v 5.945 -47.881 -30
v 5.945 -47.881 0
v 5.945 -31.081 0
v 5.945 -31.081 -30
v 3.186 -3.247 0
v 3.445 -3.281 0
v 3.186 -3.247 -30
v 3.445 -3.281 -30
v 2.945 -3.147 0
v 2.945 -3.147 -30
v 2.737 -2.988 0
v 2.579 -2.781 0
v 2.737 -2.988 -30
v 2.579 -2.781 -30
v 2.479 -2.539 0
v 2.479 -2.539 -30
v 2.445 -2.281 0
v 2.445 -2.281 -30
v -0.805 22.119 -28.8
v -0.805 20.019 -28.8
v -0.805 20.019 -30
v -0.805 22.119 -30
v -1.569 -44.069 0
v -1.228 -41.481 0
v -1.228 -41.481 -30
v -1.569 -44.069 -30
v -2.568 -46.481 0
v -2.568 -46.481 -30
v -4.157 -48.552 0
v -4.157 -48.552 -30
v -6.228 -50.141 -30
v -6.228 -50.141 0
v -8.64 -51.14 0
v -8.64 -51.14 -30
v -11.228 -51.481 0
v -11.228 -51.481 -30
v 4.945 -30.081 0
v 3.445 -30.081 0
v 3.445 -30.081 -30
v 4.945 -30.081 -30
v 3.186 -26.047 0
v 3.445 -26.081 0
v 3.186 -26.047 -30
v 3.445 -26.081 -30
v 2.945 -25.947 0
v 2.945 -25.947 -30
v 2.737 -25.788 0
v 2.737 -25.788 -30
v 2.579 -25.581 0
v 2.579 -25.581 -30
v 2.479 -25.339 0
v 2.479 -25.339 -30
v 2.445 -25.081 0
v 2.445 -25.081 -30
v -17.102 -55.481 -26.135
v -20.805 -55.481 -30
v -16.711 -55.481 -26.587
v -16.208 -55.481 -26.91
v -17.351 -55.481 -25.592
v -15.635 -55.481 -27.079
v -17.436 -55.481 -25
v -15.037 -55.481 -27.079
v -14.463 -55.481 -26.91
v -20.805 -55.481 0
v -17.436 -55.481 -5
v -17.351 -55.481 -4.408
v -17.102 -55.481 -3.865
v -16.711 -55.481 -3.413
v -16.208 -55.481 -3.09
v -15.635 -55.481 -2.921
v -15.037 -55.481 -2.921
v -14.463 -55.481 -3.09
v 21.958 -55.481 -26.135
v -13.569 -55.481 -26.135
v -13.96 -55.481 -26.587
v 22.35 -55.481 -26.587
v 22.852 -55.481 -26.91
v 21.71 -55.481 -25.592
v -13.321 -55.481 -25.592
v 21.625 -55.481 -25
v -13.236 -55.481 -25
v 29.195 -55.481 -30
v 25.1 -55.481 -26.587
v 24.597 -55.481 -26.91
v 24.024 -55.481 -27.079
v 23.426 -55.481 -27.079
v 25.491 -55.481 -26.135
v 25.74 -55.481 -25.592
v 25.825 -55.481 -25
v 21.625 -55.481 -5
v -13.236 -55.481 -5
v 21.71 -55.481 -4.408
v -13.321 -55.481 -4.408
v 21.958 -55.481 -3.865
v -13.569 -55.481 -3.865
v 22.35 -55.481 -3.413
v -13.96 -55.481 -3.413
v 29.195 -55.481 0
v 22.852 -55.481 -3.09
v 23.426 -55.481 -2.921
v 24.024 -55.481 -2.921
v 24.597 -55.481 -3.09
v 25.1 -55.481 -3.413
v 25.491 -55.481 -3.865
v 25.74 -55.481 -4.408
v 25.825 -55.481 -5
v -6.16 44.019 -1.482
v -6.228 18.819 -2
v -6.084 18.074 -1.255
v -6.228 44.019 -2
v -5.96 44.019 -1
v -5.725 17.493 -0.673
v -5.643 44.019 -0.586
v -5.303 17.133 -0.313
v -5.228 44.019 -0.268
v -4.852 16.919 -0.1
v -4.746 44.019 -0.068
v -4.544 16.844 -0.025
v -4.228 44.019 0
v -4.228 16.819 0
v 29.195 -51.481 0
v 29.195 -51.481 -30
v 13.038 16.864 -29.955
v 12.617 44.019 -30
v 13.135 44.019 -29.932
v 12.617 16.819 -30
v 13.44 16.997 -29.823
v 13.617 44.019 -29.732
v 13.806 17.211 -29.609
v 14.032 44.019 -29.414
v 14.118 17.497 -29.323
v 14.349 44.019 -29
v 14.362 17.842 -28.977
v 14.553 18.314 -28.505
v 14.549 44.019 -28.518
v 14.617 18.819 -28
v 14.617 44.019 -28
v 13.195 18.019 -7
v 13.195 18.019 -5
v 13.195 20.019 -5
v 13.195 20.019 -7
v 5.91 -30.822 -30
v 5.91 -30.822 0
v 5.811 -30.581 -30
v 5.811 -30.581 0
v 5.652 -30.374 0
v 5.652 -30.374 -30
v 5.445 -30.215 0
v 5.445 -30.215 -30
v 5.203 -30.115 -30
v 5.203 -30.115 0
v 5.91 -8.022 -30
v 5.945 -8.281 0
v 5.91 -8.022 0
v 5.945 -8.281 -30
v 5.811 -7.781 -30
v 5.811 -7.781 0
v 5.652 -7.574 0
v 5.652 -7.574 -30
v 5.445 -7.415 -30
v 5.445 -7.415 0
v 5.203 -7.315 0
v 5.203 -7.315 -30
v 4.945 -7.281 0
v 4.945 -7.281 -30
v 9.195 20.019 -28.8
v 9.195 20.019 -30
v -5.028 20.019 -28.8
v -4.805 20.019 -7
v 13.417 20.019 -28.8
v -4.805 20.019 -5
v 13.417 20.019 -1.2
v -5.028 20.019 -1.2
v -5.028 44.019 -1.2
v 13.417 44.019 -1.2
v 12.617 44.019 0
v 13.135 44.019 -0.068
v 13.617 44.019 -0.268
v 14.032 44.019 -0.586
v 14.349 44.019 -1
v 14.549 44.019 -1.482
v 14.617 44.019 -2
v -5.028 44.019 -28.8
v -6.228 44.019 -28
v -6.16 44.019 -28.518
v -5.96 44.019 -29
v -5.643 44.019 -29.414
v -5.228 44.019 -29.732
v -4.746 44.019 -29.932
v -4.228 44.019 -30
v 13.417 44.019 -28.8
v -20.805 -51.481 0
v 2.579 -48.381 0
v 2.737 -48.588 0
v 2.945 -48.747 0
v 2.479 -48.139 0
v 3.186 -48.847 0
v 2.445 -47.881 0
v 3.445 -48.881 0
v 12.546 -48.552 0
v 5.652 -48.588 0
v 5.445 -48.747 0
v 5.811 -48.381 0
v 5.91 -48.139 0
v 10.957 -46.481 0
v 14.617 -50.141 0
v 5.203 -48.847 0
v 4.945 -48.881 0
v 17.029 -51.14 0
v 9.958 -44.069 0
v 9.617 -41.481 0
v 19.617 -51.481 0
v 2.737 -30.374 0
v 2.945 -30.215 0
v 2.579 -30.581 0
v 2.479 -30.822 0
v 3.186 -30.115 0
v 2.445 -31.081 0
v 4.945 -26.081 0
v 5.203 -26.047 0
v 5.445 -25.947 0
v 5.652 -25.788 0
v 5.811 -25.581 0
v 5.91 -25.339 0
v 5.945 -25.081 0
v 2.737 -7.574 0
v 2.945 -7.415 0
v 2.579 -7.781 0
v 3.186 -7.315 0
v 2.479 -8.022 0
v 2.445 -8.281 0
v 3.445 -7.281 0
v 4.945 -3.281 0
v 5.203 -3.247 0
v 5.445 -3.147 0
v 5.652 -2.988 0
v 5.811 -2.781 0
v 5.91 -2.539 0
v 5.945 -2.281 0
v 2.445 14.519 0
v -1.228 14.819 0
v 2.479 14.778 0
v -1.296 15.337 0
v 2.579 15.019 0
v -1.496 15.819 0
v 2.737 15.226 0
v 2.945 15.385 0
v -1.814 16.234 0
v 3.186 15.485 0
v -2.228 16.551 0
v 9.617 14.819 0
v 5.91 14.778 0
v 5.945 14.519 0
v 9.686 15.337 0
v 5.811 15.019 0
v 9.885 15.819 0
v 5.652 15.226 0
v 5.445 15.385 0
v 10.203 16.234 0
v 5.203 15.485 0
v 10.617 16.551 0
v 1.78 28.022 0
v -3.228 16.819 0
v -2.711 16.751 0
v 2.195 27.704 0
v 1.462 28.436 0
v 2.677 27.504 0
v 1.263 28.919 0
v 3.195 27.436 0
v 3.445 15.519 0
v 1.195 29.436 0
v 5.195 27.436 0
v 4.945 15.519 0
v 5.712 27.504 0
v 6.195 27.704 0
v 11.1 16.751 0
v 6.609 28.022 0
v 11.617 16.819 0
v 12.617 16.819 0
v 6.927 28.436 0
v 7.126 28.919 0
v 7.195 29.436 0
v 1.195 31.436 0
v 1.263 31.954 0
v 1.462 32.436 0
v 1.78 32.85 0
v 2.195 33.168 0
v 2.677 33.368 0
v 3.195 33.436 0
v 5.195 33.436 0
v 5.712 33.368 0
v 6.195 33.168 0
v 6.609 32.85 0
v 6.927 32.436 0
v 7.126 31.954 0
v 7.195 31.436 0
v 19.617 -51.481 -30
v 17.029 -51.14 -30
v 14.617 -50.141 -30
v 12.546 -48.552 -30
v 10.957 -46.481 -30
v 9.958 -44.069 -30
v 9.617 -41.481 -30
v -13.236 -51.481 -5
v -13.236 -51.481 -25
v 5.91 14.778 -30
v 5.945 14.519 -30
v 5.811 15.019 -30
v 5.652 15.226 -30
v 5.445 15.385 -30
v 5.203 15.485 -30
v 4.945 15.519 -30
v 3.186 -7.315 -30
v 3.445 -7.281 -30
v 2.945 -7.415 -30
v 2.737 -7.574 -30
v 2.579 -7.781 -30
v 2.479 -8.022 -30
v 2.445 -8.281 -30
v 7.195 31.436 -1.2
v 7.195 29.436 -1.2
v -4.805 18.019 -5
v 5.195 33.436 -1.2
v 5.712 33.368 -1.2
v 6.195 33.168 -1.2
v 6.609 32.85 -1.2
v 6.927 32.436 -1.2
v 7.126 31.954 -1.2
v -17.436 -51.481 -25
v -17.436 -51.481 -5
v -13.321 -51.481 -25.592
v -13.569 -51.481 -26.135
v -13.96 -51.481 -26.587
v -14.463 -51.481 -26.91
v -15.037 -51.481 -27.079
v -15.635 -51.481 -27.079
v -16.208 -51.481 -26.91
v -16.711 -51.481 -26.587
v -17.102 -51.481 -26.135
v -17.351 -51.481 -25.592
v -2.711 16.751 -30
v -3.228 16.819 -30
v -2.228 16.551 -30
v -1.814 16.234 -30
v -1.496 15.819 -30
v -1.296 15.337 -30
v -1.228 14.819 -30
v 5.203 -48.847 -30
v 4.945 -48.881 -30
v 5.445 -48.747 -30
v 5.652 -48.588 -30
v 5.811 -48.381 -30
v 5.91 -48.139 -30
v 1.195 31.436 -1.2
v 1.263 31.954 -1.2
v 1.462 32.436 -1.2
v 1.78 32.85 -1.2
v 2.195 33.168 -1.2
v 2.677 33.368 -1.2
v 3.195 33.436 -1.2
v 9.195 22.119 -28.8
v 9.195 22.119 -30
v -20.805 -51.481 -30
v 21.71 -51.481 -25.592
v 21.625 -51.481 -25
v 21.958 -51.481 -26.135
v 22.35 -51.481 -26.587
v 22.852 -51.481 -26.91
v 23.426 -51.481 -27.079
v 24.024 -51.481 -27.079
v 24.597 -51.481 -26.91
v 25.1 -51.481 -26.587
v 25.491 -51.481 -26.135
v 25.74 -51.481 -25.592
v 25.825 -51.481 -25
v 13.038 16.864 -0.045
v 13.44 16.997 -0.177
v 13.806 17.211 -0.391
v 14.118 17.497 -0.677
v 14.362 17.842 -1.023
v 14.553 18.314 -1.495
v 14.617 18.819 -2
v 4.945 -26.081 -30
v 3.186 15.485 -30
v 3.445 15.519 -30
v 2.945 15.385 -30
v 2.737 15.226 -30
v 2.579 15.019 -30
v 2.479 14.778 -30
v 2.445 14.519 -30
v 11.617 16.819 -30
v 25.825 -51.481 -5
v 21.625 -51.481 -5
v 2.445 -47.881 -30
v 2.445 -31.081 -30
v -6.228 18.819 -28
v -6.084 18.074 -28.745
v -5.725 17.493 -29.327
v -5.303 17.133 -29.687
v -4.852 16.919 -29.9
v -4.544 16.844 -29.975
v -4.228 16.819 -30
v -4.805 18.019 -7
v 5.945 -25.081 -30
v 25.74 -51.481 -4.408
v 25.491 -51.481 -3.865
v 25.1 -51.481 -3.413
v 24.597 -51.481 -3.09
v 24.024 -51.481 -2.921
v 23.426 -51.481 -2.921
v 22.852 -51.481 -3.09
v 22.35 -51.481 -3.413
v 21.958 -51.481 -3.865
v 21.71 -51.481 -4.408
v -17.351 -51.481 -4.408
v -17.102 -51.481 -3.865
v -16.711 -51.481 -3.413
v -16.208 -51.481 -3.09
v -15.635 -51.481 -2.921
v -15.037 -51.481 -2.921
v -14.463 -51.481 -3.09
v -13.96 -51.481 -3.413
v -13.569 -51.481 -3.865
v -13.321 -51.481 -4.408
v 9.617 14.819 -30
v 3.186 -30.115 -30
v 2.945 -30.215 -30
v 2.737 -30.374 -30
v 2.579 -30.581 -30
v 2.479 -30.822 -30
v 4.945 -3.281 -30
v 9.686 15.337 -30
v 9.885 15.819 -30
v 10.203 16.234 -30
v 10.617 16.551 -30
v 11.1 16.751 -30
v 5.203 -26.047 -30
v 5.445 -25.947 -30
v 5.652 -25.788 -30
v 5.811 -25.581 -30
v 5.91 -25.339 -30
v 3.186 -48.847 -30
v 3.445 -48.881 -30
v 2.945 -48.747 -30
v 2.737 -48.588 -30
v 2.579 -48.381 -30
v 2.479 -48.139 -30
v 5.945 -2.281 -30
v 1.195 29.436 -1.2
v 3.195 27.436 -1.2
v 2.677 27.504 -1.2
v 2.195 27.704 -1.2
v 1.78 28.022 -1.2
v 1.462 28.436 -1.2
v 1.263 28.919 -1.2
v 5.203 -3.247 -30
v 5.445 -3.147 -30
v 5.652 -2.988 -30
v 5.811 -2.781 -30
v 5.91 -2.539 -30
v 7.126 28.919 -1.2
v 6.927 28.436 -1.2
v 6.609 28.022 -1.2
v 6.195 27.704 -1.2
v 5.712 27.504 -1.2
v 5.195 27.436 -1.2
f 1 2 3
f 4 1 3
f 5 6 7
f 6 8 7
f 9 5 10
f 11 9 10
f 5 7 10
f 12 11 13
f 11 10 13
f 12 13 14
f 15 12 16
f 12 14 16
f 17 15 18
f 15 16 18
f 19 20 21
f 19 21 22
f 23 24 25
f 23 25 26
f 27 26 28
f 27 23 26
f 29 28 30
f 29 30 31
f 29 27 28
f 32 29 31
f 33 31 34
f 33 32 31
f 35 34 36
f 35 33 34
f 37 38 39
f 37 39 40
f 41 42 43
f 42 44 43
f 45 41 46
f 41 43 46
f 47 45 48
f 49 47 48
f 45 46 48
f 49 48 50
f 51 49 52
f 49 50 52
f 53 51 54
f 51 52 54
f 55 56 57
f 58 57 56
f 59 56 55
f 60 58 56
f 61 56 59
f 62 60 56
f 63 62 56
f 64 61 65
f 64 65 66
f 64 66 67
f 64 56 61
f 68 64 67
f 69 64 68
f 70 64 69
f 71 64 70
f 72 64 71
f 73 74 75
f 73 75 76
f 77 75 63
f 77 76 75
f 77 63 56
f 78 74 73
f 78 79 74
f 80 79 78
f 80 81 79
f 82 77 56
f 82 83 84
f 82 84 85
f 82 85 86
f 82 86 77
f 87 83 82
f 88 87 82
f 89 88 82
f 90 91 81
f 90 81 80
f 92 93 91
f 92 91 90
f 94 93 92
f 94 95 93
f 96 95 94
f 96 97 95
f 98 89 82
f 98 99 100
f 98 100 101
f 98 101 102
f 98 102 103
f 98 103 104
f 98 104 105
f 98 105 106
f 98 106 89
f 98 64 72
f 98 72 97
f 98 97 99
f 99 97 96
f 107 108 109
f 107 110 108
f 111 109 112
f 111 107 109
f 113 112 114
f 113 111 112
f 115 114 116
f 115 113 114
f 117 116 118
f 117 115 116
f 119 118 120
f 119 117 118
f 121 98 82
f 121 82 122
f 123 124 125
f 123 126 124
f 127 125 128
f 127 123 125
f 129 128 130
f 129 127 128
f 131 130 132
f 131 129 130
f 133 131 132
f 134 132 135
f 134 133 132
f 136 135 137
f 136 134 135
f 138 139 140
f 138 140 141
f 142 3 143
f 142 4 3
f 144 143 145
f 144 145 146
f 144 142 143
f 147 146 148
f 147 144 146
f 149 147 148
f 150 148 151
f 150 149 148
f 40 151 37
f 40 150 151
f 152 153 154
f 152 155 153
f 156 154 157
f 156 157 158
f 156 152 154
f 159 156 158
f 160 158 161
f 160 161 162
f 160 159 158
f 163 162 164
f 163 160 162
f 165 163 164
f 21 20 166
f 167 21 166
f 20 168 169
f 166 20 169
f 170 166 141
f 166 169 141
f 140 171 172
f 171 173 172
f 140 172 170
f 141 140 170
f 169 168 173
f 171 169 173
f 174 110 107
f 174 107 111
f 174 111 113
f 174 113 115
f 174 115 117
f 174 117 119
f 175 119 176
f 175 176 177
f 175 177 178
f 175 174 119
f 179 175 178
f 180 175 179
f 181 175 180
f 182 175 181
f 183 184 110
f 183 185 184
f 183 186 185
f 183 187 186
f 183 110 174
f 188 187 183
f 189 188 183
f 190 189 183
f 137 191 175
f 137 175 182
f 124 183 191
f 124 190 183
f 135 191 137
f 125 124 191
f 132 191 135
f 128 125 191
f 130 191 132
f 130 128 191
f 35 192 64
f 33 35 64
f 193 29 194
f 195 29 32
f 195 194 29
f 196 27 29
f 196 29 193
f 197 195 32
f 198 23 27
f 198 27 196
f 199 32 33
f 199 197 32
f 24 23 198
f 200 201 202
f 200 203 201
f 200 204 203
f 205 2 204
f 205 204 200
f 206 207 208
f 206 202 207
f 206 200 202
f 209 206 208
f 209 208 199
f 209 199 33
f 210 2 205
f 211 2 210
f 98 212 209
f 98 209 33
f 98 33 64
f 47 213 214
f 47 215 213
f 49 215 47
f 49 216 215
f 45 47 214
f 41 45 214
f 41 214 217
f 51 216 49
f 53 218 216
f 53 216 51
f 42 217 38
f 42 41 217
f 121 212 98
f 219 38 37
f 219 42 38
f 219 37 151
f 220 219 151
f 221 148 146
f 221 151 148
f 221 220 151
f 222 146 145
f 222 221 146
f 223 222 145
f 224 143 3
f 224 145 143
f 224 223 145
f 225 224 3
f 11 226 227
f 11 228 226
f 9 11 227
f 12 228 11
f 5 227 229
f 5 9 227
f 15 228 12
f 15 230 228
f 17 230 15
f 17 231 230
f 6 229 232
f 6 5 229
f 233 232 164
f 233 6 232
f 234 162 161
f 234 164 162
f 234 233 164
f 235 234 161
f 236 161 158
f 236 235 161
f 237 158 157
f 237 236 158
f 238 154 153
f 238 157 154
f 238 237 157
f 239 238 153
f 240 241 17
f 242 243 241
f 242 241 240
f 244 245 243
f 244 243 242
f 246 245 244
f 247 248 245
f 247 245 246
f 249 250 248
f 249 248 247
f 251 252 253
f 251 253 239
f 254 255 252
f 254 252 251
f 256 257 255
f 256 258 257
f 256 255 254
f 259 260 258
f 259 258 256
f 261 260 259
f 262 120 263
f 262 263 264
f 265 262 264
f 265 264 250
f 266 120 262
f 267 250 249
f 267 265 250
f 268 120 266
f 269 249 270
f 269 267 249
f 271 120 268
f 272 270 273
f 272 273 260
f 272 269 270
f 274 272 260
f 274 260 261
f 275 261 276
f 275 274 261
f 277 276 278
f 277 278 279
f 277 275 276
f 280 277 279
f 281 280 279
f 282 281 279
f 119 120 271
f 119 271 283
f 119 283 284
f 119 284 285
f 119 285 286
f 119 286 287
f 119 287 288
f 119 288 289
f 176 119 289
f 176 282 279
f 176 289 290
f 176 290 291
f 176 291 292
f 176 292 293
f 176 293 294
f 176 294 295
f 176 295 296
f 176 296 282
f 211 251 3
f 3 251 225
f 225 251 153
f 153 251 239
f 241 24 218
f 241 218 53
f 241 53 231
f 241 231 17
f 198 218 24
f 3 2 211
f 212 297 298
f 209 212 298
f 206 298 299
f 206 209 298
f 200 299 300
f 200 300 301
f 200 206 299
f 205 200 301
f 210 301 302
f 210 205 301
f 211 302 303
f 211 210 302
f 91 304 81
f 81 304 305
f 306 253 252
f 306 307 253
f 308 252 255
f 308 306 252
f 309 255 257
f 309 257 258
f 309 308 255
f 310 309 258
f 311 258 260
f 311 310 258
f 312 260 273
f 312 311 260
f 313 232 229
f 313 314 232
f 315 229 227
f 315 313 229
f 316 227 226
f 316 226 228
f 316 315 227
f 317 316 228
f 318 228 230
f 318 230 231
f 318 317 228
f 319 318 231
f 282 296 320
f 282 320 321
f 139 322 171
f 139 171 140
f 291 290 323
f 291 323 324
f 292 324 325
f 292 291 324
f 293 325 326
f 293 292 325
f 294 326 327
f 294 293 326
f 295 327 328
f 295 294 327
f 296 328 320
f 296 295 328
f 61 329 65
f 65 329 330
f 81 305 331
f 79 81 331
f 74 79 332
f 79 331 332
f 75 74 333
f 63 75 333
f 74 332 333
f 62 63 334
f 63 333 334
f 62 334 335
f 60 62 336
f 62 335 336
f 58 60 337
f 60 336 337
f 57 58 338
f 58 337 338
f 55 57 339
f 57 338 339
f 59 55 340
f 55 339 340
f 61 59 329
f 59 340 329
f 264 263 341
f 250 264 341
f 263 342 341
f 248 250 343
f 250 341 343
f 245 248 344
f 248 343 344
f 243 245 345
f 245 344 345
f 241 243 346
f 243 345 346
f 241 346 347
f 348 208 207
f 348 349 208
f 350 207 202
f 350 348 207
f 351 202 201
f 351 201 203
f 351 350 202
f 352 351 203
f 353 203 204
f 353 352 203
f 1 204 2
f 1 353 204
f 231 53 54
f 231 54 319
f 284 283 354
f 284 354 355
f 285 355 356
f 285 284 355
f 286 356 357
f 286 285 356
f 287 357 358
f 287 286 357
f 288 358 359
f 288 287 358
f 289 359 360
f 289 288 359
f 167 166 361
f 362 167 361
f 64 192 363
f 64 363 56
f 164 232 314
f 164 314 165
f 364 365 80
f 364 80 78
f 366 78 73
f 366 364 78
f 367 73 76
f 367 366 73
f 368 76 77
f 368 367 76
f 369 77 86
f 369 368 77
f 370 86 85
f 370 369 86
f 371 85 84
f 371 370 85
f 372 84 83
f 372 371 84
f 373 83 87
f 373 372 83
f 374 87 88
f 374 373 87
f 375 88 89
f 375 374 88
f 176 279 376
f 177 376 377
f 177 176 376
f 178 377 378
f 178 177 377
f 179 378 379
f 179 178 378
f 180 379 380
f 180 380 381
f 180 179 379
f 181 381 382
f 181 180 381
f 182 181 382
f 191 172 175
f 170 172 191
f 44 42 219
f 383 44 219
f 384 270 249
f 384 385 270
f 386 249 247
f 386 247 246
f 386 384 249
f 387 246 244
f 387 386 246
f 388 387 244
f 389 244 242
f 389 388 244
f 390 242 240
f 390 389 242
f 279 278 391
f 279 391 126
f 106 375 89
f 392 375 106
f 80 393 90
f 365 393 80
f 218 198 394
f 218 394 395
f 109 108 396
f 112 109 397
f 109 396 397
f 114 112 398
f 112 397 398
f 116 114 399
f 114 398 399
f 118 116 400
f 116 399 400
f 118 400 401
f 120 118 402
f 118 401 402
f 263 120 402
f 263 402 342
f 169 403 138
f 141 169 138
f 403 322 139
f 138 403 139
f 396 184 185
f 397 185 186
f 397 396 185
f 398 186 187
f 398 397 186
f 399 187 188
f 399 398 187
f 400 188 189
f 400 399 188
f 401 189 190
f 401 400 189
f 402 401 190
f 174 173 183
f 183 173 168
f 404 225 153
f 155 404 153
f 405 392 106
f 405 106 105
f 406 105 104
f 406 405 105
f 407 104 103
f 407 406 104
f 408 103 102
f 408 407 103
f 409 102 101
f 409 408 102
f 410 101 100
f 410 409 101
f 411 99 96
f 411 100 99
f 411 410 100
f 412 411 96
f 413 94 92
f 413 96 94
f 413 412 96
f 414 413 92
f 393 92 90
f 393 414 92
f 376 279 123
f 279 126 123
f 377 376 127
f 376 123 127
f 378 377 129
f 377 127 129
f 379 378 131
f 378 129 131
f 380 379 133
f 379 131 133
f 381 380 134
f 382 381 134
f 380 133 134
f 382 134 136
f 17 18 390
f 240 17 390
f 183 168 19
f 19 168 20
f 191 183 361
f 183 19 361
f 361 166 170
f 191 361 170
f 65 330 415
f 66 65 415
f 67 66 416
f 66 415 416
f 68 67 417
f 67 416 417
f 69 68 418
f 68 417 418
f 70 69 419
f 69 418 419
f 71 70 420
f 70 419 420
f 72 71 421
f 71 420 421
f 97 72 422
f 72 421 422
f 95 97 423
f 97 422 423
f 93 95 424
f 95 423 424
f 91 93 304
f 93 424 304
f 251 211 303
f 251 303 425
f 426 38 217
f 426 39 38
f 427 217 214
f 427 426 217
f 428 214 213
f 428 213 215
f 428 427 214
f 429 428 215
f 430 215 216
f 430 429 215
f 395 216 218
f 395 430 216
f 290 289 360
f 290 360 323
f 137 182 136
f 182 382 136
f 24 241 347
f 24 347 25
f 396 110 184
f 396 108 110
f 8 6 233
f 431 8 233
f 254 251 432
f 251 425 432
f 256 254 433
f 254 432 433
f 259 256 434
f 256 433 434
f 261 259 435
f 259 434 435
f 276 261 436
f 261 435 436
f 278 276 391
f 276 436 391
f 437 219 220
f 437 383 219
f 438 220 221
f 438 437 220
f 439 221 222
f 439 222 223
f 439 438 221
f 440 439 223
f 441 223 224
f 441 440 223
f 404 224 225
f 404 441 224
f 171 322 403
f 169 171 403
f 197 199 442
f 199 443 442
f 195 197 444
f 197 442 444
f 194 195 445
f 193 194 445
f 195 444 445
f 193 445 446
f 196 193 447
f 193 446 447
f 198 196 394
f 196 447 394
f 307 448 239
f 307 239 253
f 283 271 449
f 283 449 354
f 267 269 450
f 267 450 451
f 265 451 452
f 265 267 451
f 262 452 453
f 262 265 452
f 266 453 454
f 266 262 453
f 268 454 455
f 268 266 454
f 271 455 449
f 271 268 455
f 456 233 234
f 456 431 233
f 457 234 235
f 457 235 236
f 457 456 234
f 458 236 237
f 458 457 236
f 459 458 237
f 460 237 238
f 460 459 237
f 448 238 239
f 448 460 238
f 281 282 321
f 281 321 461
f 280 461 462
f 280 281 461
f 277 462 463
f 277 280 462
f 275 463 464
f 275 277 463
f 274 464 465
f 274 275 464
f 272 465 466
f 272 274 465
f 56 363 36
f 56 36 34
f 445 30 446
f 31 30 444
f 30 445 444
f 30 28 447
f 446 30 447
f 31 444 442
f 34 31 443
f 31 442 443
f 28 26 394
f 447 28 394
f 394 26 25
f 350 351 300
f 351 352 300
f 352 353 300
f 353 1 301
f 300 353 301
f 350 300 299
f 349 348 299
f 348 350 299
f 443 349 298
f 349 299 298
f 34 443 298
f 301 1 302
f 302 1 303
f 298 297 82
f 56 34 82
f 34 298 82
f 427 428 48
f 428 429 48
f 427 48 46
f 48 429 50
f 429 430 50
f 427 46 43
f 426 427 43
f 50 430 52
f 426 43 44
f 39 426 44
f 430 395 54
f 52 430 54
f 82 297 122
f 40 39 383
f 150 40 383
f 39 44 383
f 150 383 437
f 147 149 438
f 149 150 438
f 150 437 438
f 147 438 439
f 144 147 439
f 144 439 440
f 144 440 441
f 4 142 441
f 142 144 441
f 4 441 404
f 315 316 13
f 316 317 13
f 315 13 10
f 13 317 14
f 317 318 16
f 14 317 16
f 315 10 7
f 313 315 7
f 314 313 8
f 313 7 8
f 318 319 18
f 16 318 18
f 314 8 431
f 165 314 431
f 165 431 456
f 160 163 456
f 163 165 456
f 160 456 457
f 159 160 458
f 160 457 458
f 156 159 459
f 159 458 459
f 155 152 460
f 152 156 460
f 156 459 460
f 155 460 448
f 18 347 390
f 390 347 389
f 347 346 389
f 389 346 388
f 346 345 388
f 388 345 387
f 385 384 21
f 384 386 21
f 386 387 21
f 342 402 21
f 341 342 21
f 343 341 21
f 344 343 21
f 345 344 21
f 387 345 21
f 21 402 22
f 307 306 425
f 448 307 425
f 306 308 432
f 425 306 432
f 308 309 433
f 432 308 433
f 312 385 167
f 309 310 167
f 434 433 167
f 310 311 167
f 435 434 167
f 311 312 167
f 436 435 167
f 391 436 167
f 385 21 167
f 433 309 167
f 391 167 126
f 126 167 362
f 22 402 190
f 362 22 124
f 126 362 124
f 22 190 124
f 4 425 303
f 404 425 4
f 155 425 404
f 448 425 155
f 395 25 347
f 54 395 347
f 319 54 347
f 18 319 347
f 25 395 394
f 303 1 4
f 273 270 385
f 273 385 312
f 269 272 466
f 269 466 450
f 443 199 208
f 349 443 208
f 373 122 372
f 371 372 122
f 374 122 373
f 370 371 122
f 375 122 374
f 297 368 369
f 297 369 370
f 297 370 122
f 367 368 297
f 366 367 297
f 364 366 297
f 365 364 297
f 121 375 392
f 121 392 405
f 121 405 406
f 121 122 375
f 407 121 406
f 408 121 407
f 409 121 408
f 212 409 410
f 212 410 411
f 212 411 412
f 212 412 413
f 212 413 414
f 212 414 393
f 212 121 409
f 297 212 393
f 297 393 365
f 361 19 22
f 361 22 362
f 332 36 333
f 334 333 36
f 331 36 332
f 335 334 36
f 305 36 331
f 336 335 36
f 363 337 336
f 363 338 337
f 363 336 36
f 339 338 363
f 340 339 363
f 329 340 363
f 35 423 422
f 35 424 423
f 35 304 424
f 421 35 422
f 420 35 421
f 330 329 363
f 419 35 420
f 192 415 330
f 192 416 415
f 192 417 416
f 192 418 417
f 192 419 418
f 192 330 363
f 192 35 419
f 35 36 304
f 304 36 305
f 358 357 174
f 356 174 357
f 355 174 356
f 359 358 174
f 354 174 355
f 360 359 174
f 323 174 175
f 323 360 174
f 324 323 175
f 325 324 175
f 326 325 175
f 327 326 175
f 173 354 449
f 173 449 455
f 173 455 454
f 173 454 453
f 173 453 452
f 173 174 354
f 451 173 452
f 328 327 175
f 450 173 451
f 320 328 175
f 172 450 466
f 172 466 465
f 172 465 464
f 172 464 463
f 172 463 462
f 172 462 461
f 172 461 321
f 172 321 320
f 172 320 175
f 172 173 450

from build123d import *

# Parameters (mm, degrees)
CROQUIS1_W              = 20.84578855
CROQUIS1_H              = 73.5
SALIENTE_EXTRUIR1_DEPTH = 30
CROQUIS2_W              = 20.84578855
CROQUIS2_H              = 30
CROQUIS2_W_2            = 18
CROQUIS2_H_2            = 2
SALIENTE_EXTRUIR2_DEPTH = 2
CROQUIS3_W              = 20.84578855
CROQUIS3_H              = 30
CROQUIS3_W_2            = 18.44578855
CROQUIS3_H_2            = 27.6
SALIENTE_EXTRUIR3_DEPTH = 24
CORTAR_EXTRUIR1_DEPTH   = 12
CROQUIS6_W              = 10
CROQUIS6_H              = 2.1
CORTAR_EXTRUIR2_DEPTH   = 12
CROQUIS7_W              = 5
CROQUIS7_H              = 72.3
CORTAR_EXTRUIR3_DEPTH   = 81
REDONDEO1_R             = 2
SALIENTE_EXTRUIR4_DEPTH = 30
CORTAR_EXTRUIR4_DEPTH   = 30
CROQUIS11_W             = 3.5
CROQUIS11_H             = 18.8
CORTAR_EXTRUIR5_DEPTH   = 30
REDONDEO2_R             = 1


with BuildPart() as part:
    # Croquis1 → Saliente-Extruir1 (new body)
    with BuildSketch(Plane.XY):
        with Locations((4.194544399, -18.730645161)):
            Rectangle(CROQUIS1_W, CROQUIS1_H)
    extrude(amount=-SALIENTE_EXTRUIR1_DEPTH)

    # Croquis2 → Saliente-Extruir2 (add)
    with BuildSketch(Plane(origin=(0, 18.019354839, 0), x_dir=(1, 0, 0), z_dir=(0, 1, 0))):
        with Locations((4.194544399, 15)):
            Rectangle(CROQUIS2_W, CROQUIS2_H)
        with Locations((4.194544399, 6)):
            Rectangle(CROQUIS2_W_2, CROQUIS2_H_2, mode=Mode.SUBTRACT)
    extrude(amount=SALIENTE_EXTRUIR2_DEPTH)

    # Croquis3 → Saliente-Extruir3 (add)
    with BuildSketch(Plane(origin=(0, 20.019354839, 0), x_dir=(1, 0, 0), z_dir=(0, 1, 0))):
        with Locations((4.194544399, 15)):
            Rectangle(CROQUIS3_W, CROQUIS3_H)
        with Locations((4.194544399, 15)):
            Rectangle(CROQUIS3_W_2, CROQUIS3_H_2, mode=Mode.SUBTRACT)
    extrude(amount=SALIENTE_EXTRUIR3_DEPTH)

    # Croquis4 → Cortar-Extruir1 (cut)
    with BuildSketch(Plane.XY):
        with BuildLine():
            Line((3.194544399, 33.436155454), (5.194544399, 33.436155454))
            ThreePointArc((5.194544399, 33.436155454), (6.608757961, 32.850369016), (7.194544399, 31.436155454))
            Line((7.194544399, 31.436155454), (7.194544399, 29.436155454))
            ThreePointArc((7.194544399, 29.436155454), (6.608757961, 28.021941892), (5.194544399, 27.436155454))
            Line((5.194544399, 27.436155454), (3.194544399, 27.436155454))
            ThreePointArc((3.194544399, 27.436155454), (1.780330837, 28.021941892), (1.194544399, 29.436155454))
            Line((1.194544399, 29.436155454), (1.194544399, 31.436155454))
            ThreePointArc((1.194544399, 31.436155454), (1.780330837, 32.850369016), (3.194544399, 33.436155454))
        make_face()
    extrude(amount=-CORTAR_EXTRUIR1_DEPTH, mode=Mode.SUBTRACT)

    # Croquis6 → Cortar-Extruir2 (cut)
    with BuildSketch(Plane.XY.offset(-28.8)):
        with Locations((4.194544399, 21.069354839)):
            Rectangle(CROQUIS6_W, CROQUIS6_H)
    extrude(amount=-CORTAR_EXTRUIR2_DEPTH, mode=Mode.SUBTRACT)

    # Croquis7 → Cortar-Extruir3 (cut)
    with BuildSketch(Plane.XY):
        with Locations((-3.728349876, -19.330645161)):
            Rectangle(CROQUIS7_W, CROQUIS7_H)
        with Locations((12.117438674, -19.330645161)):
            Rectangle(CROQUIS7_W, CROQUIS7_H)
    extrude(amount=-CORTAR_EXTRUIR3_DEPTH, mode=Mode.SUBTRACT)

    # Redondeo1
    redondeo1_edges = [part.edges().sort_by_distance(p)[0] for p in [
        (-6.228349876, 16.819354839, -15),
        (-1.228349876, 16.819354839, -15),
        (14.617438674, 16.819354839, -15),
        (9.617438674, 16.819354839, -15),
        (-6.228349876, 30.419354839, -30),
        (14.617438674, 30.419354839, -30),
        (-6.228349876, 30.419354839, 0),
        (14.617438674, 30.419354839, 0),
    ]]
    fillet(redondeo1_edges, radius=REDONDEO1_R)

    # Croquis9 → Saliente-Extruir4 (add)
    with BuildSketch(Plane.XY):
        with BuildLine():
            Line((-20.805455601, -55.480645161), (29.194544399, -55.480645161))
            Line((29.194544399, -55.480645161), (29.194544399, -51.480645161))
            Line((29.194544399, -51.480645161), (19.617438674, -51.480645161))
            ThreePointArc((19.617438674, -51.480645161), (12.546370862, -48.551712973), (9.617438674, -41.480645161))
            Line((9.617438674, -41.480645161), (9.617438674, -20.330645161))
            Line((9.617438674, -20.330645161), (-1.228349876, -20.330645161))
            Line((-1.228349876, -20.330645161), (-1.228349876, -41.480645161))
            ThreePointArc((-1.228349876, -41.480645161), (-4.157282064, -48.551712973), (-11.228349876, -51.480645161))
            Line((-11.228349876, -51.480645161), (-20.805455601, -51.480645161))
            Line((-20.805455601, -51.480645161), (-20.805455601, -55.480645161))
        make_face()
    extrude(amount=-SALIENTE_EXTRUIR4_DEPTH)

    # Croquis10 → Cortar-Extruir4 (cut)
    with BuildSketch(Plane(origin=(0, -51.480645161, 0), x_dir=(1, 0, 0), z_dir=(0, 1, 0))):
        with BuildLine():
            Line((25.824740978, 25), (25.824740978, 5))
            ThreePointArc((25.824740978, 5), (23.724740978, 2.9), (21.624740978, 5))
            Line((21.624740978, 5), (21.624740978, 25))
            ThreePointArc((21.624740978, 25), (23.724740978, 27.1), (25.824740978, 25))
        make_face()
        with BuildLine():
            Line((-17.43565218, 25), (-17.43565218, 5))
            ThreePointArc((-17.43565218, 5), (-15.33565218, 2.9), (-13.23565218, 5))
            Line((-13.23565218, 5), (-13.23565218, 25))
            ThreePointArc((-13.23565218, 25), (-15.33565218, 27.1), (-17.43565218, 25))
        make_face()
    extrude(amount=-CORTAR_EXTRUIR4_DEPTH, mode=Mode.SUBTRACT)

    # Croquis11 → Cortar-Extruir5 (cut)
    with BuildSketch(Plane.XY):
        with Locations((4.194544399, 6.119354839)):
            Rectangle(CROQUIS11_W, CROQUIS11_H)
        with Locations((4.194544399, -16.680645161)):
            Rectangle(CROQUIS11_W, CROQUIS11_H)
        with Locations((4.194544399, -39.480645161)):
            Rectangle(CROQUIS11_W, CROQUIS11_H)
    extrude(amount=-CORTAR_EXTRUIR5_DEPTH, mode=Mode.SUBTRACT)

    # Redondeo2
    redondeo2_edges = [part.edges().sort_by_distance(p)[0] for p in [
        (2.444544399, -3.280645161, -15),
        (2.444544399, 15.519354839, -15),
        (5.944544399, 15.519354839, -15),
        (5.944544399, -3.280645161, -15),
        (2.444544399, -26.080645161, -15),
        (2.444544399, -7.280645161, -15),
        (5.944544399, -7.280645161, -15),
        (5.944544399, -26.080645161, -15),
        (2.444544399, -48.880645161, -15),
        (2.444544399, -30.080645161, -15),
        (5.944544399, -30.080645161, -15),
        (5.944544399, -48.880645161, -15),
    ]]
    fillet(redondeo2_edges, radius=REDONDEO2_R)


solid = part.part
